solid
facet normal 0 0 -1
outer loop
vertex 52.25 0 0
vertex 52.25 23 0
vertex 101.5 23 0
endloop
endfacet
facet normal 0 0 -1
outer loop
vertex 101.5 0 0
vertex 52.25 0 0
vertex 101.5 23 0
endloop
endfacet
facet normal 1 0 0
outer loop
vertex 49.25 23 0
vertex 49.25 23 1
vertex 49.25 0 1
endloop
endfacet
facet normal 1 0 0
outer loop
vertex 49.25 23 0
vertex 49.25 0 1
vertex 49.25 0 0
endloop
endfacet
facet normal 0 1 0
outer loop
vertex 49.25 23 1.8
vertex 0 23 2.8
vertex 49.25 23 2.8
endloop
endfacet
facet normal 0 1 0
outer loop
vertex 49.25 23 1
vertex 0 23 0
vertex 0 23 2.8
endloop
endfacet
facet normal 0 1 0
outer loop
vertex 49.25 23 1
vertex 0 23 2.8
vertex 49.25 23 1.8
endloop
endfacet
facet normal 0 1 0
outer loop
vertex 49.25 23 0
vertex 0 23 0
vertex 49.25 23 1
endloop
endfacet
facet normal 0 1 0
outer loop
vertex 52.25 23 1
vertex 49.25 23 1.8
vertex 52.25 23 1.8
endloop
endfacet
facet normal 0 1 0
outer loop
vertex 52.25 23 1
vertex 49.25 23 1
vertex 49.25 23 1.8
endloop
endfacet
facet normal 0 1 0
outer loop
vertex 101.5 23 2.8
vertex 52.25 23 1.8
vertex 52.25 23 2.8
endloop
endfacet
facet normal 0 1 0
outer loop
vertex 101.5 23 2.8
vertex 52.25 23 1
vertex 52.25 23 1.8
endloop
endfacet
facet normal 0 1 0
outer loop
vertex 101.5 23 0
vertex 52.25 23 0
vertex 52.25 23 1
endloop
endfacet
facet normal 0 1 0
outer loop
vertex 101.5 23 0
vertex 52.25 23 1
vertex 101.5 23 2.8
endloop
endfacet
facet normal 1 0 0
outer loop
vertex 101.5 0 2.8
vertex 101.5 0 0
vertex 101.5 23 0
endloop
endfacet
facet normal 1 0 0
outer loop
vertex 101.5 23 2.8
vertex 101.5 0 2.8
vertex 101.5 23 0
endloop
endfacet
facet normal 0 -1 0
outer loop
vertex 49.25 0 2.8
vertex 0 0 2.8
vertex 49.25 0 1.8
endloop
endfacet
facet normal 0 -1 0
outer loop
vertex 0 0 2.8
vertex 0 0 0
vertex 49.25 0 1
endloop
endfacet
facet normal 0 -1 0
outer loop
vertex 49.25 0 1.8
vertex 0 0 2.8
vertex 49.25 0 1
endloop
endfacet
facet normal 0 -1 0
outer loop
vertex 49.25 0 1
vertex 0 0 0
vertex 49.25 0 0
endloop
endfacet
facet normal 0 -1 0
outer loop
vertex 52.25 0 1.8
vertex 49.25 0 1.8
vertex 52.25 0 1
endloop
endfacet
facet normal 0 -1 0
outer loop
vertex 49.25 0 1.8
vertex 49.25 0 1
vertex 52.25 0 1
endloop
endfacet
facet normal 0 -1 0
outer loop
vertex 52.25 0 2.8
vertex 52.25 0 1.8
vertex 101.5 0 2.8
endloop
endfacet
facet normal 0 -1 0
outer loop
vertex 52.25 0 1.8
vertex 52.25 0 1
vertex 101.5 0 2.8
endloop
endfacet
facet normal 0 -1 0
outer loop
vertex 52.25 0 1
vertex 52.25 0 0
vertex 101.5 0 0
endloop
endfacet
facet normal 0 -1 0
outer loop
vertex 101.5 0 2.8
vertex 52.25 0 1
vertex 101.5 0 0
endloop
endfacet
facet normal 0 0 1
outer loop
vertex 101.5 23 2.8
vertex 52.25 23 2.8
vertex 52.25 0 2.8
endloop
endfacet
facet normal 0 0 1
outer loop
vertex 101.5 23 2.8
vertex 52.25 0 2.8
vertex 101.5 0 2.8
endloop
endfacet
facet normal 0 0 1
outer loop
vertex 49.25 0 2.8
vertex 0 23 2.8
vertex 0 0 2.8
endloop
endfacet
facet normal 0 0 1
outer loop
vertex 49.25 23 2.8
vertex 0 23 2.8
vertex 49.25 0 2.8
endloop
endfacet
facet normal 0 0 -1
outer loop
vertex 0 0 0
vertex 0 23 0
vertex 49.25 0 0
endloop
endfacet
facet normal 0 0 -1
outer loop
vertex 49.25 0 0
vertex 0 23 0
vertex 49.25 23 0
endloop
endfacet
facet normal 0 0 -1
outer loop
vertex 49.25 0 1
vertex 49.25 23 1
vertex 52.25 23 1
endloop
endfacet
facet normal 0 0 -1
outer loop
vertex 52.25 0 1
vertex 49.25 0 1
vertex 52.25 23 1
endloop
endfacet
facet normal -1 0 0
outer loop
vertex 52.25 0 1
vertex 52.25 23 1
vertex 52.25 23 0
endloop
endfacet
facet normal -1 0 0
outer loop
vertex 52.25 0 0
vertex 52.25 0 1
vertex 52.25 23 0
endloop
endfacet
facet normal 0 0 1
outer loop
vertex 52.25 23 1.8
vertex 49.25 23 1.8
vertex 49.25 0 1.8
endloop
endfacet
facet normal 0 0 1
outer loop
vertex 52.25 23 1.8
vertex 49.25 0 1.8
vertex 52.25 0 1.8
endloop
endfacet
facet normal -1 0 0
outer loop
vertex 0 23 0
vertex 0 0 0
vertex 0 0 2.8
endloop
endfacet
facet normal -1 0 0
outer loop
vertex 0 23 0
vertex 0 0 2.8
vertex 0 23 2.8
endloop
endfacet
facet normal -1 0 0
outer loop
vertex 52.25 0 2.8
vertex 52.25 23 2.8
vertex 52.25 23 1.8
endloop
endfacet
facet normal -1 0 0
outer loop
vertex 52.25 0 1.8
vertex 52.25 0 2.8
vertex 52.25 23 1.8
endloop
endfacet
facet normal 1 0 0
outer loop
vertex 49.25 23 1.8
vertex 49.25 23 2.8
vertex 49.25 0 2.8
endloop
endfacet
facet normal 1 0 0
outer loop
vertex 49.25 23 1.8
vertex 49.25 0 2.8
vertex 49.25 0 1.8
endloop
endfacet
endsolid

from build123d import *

# Parameters (mm, degrees)
SKETCH1_W           = 101.5
SKETCH1_H           = 23
BOSS_EXTRUDE1_DEPTH = 2.8
SKETCH2_W           = 3
SKETCH2_H           = 1
CUT_EXTRUDE1_DEPTH  = 33
SKETCH3_W           = 3
SKETCH3_H           = 1
CUT_EXTRUDE2_DEPTH  = 33


with BuildPart() as part:
    # Sketch1 → Boss-Extrude1 (new body)
    with BuildSketch(Plane.XY):
        with Locations((50.75, 11.5)):
            Rectangle(SKETCH1_W, SKETCH1_H)
    extrude(amount=BOSS_EXTRUDE1_DEPTH)

    # Sketch2 → Cut-Extrude1 (cut)
    with BuildSketch(Plane(origin=(0, 23, 0), x_dir=(1, 0, 0), z_dir=(0, 1, 0))):
        with Locations((50.75, -0.5)):
            Rectangle(SKETCH2_W, SKETCH2_H)
    extrude(amount=-CUT_EXTRUDE1_DEPTH, mode=Mode.SUBTRACT)

    # Sketch3 → Cut-Extrude2 (cut)
    with BuildSketch(Plane(origin=(0, 23, 0), x_dir=(1, 0, 0), z_dir=(0, 1, 0))):
        with Locations((50.75, -2.3)):
            Rectangle(SKETCH3_W, SKETCH3_H)
    extrude(amount=-CUT_EXTRUDE2_DEPTH, mode=Mode.SUBTRACT)


solid = part.part
